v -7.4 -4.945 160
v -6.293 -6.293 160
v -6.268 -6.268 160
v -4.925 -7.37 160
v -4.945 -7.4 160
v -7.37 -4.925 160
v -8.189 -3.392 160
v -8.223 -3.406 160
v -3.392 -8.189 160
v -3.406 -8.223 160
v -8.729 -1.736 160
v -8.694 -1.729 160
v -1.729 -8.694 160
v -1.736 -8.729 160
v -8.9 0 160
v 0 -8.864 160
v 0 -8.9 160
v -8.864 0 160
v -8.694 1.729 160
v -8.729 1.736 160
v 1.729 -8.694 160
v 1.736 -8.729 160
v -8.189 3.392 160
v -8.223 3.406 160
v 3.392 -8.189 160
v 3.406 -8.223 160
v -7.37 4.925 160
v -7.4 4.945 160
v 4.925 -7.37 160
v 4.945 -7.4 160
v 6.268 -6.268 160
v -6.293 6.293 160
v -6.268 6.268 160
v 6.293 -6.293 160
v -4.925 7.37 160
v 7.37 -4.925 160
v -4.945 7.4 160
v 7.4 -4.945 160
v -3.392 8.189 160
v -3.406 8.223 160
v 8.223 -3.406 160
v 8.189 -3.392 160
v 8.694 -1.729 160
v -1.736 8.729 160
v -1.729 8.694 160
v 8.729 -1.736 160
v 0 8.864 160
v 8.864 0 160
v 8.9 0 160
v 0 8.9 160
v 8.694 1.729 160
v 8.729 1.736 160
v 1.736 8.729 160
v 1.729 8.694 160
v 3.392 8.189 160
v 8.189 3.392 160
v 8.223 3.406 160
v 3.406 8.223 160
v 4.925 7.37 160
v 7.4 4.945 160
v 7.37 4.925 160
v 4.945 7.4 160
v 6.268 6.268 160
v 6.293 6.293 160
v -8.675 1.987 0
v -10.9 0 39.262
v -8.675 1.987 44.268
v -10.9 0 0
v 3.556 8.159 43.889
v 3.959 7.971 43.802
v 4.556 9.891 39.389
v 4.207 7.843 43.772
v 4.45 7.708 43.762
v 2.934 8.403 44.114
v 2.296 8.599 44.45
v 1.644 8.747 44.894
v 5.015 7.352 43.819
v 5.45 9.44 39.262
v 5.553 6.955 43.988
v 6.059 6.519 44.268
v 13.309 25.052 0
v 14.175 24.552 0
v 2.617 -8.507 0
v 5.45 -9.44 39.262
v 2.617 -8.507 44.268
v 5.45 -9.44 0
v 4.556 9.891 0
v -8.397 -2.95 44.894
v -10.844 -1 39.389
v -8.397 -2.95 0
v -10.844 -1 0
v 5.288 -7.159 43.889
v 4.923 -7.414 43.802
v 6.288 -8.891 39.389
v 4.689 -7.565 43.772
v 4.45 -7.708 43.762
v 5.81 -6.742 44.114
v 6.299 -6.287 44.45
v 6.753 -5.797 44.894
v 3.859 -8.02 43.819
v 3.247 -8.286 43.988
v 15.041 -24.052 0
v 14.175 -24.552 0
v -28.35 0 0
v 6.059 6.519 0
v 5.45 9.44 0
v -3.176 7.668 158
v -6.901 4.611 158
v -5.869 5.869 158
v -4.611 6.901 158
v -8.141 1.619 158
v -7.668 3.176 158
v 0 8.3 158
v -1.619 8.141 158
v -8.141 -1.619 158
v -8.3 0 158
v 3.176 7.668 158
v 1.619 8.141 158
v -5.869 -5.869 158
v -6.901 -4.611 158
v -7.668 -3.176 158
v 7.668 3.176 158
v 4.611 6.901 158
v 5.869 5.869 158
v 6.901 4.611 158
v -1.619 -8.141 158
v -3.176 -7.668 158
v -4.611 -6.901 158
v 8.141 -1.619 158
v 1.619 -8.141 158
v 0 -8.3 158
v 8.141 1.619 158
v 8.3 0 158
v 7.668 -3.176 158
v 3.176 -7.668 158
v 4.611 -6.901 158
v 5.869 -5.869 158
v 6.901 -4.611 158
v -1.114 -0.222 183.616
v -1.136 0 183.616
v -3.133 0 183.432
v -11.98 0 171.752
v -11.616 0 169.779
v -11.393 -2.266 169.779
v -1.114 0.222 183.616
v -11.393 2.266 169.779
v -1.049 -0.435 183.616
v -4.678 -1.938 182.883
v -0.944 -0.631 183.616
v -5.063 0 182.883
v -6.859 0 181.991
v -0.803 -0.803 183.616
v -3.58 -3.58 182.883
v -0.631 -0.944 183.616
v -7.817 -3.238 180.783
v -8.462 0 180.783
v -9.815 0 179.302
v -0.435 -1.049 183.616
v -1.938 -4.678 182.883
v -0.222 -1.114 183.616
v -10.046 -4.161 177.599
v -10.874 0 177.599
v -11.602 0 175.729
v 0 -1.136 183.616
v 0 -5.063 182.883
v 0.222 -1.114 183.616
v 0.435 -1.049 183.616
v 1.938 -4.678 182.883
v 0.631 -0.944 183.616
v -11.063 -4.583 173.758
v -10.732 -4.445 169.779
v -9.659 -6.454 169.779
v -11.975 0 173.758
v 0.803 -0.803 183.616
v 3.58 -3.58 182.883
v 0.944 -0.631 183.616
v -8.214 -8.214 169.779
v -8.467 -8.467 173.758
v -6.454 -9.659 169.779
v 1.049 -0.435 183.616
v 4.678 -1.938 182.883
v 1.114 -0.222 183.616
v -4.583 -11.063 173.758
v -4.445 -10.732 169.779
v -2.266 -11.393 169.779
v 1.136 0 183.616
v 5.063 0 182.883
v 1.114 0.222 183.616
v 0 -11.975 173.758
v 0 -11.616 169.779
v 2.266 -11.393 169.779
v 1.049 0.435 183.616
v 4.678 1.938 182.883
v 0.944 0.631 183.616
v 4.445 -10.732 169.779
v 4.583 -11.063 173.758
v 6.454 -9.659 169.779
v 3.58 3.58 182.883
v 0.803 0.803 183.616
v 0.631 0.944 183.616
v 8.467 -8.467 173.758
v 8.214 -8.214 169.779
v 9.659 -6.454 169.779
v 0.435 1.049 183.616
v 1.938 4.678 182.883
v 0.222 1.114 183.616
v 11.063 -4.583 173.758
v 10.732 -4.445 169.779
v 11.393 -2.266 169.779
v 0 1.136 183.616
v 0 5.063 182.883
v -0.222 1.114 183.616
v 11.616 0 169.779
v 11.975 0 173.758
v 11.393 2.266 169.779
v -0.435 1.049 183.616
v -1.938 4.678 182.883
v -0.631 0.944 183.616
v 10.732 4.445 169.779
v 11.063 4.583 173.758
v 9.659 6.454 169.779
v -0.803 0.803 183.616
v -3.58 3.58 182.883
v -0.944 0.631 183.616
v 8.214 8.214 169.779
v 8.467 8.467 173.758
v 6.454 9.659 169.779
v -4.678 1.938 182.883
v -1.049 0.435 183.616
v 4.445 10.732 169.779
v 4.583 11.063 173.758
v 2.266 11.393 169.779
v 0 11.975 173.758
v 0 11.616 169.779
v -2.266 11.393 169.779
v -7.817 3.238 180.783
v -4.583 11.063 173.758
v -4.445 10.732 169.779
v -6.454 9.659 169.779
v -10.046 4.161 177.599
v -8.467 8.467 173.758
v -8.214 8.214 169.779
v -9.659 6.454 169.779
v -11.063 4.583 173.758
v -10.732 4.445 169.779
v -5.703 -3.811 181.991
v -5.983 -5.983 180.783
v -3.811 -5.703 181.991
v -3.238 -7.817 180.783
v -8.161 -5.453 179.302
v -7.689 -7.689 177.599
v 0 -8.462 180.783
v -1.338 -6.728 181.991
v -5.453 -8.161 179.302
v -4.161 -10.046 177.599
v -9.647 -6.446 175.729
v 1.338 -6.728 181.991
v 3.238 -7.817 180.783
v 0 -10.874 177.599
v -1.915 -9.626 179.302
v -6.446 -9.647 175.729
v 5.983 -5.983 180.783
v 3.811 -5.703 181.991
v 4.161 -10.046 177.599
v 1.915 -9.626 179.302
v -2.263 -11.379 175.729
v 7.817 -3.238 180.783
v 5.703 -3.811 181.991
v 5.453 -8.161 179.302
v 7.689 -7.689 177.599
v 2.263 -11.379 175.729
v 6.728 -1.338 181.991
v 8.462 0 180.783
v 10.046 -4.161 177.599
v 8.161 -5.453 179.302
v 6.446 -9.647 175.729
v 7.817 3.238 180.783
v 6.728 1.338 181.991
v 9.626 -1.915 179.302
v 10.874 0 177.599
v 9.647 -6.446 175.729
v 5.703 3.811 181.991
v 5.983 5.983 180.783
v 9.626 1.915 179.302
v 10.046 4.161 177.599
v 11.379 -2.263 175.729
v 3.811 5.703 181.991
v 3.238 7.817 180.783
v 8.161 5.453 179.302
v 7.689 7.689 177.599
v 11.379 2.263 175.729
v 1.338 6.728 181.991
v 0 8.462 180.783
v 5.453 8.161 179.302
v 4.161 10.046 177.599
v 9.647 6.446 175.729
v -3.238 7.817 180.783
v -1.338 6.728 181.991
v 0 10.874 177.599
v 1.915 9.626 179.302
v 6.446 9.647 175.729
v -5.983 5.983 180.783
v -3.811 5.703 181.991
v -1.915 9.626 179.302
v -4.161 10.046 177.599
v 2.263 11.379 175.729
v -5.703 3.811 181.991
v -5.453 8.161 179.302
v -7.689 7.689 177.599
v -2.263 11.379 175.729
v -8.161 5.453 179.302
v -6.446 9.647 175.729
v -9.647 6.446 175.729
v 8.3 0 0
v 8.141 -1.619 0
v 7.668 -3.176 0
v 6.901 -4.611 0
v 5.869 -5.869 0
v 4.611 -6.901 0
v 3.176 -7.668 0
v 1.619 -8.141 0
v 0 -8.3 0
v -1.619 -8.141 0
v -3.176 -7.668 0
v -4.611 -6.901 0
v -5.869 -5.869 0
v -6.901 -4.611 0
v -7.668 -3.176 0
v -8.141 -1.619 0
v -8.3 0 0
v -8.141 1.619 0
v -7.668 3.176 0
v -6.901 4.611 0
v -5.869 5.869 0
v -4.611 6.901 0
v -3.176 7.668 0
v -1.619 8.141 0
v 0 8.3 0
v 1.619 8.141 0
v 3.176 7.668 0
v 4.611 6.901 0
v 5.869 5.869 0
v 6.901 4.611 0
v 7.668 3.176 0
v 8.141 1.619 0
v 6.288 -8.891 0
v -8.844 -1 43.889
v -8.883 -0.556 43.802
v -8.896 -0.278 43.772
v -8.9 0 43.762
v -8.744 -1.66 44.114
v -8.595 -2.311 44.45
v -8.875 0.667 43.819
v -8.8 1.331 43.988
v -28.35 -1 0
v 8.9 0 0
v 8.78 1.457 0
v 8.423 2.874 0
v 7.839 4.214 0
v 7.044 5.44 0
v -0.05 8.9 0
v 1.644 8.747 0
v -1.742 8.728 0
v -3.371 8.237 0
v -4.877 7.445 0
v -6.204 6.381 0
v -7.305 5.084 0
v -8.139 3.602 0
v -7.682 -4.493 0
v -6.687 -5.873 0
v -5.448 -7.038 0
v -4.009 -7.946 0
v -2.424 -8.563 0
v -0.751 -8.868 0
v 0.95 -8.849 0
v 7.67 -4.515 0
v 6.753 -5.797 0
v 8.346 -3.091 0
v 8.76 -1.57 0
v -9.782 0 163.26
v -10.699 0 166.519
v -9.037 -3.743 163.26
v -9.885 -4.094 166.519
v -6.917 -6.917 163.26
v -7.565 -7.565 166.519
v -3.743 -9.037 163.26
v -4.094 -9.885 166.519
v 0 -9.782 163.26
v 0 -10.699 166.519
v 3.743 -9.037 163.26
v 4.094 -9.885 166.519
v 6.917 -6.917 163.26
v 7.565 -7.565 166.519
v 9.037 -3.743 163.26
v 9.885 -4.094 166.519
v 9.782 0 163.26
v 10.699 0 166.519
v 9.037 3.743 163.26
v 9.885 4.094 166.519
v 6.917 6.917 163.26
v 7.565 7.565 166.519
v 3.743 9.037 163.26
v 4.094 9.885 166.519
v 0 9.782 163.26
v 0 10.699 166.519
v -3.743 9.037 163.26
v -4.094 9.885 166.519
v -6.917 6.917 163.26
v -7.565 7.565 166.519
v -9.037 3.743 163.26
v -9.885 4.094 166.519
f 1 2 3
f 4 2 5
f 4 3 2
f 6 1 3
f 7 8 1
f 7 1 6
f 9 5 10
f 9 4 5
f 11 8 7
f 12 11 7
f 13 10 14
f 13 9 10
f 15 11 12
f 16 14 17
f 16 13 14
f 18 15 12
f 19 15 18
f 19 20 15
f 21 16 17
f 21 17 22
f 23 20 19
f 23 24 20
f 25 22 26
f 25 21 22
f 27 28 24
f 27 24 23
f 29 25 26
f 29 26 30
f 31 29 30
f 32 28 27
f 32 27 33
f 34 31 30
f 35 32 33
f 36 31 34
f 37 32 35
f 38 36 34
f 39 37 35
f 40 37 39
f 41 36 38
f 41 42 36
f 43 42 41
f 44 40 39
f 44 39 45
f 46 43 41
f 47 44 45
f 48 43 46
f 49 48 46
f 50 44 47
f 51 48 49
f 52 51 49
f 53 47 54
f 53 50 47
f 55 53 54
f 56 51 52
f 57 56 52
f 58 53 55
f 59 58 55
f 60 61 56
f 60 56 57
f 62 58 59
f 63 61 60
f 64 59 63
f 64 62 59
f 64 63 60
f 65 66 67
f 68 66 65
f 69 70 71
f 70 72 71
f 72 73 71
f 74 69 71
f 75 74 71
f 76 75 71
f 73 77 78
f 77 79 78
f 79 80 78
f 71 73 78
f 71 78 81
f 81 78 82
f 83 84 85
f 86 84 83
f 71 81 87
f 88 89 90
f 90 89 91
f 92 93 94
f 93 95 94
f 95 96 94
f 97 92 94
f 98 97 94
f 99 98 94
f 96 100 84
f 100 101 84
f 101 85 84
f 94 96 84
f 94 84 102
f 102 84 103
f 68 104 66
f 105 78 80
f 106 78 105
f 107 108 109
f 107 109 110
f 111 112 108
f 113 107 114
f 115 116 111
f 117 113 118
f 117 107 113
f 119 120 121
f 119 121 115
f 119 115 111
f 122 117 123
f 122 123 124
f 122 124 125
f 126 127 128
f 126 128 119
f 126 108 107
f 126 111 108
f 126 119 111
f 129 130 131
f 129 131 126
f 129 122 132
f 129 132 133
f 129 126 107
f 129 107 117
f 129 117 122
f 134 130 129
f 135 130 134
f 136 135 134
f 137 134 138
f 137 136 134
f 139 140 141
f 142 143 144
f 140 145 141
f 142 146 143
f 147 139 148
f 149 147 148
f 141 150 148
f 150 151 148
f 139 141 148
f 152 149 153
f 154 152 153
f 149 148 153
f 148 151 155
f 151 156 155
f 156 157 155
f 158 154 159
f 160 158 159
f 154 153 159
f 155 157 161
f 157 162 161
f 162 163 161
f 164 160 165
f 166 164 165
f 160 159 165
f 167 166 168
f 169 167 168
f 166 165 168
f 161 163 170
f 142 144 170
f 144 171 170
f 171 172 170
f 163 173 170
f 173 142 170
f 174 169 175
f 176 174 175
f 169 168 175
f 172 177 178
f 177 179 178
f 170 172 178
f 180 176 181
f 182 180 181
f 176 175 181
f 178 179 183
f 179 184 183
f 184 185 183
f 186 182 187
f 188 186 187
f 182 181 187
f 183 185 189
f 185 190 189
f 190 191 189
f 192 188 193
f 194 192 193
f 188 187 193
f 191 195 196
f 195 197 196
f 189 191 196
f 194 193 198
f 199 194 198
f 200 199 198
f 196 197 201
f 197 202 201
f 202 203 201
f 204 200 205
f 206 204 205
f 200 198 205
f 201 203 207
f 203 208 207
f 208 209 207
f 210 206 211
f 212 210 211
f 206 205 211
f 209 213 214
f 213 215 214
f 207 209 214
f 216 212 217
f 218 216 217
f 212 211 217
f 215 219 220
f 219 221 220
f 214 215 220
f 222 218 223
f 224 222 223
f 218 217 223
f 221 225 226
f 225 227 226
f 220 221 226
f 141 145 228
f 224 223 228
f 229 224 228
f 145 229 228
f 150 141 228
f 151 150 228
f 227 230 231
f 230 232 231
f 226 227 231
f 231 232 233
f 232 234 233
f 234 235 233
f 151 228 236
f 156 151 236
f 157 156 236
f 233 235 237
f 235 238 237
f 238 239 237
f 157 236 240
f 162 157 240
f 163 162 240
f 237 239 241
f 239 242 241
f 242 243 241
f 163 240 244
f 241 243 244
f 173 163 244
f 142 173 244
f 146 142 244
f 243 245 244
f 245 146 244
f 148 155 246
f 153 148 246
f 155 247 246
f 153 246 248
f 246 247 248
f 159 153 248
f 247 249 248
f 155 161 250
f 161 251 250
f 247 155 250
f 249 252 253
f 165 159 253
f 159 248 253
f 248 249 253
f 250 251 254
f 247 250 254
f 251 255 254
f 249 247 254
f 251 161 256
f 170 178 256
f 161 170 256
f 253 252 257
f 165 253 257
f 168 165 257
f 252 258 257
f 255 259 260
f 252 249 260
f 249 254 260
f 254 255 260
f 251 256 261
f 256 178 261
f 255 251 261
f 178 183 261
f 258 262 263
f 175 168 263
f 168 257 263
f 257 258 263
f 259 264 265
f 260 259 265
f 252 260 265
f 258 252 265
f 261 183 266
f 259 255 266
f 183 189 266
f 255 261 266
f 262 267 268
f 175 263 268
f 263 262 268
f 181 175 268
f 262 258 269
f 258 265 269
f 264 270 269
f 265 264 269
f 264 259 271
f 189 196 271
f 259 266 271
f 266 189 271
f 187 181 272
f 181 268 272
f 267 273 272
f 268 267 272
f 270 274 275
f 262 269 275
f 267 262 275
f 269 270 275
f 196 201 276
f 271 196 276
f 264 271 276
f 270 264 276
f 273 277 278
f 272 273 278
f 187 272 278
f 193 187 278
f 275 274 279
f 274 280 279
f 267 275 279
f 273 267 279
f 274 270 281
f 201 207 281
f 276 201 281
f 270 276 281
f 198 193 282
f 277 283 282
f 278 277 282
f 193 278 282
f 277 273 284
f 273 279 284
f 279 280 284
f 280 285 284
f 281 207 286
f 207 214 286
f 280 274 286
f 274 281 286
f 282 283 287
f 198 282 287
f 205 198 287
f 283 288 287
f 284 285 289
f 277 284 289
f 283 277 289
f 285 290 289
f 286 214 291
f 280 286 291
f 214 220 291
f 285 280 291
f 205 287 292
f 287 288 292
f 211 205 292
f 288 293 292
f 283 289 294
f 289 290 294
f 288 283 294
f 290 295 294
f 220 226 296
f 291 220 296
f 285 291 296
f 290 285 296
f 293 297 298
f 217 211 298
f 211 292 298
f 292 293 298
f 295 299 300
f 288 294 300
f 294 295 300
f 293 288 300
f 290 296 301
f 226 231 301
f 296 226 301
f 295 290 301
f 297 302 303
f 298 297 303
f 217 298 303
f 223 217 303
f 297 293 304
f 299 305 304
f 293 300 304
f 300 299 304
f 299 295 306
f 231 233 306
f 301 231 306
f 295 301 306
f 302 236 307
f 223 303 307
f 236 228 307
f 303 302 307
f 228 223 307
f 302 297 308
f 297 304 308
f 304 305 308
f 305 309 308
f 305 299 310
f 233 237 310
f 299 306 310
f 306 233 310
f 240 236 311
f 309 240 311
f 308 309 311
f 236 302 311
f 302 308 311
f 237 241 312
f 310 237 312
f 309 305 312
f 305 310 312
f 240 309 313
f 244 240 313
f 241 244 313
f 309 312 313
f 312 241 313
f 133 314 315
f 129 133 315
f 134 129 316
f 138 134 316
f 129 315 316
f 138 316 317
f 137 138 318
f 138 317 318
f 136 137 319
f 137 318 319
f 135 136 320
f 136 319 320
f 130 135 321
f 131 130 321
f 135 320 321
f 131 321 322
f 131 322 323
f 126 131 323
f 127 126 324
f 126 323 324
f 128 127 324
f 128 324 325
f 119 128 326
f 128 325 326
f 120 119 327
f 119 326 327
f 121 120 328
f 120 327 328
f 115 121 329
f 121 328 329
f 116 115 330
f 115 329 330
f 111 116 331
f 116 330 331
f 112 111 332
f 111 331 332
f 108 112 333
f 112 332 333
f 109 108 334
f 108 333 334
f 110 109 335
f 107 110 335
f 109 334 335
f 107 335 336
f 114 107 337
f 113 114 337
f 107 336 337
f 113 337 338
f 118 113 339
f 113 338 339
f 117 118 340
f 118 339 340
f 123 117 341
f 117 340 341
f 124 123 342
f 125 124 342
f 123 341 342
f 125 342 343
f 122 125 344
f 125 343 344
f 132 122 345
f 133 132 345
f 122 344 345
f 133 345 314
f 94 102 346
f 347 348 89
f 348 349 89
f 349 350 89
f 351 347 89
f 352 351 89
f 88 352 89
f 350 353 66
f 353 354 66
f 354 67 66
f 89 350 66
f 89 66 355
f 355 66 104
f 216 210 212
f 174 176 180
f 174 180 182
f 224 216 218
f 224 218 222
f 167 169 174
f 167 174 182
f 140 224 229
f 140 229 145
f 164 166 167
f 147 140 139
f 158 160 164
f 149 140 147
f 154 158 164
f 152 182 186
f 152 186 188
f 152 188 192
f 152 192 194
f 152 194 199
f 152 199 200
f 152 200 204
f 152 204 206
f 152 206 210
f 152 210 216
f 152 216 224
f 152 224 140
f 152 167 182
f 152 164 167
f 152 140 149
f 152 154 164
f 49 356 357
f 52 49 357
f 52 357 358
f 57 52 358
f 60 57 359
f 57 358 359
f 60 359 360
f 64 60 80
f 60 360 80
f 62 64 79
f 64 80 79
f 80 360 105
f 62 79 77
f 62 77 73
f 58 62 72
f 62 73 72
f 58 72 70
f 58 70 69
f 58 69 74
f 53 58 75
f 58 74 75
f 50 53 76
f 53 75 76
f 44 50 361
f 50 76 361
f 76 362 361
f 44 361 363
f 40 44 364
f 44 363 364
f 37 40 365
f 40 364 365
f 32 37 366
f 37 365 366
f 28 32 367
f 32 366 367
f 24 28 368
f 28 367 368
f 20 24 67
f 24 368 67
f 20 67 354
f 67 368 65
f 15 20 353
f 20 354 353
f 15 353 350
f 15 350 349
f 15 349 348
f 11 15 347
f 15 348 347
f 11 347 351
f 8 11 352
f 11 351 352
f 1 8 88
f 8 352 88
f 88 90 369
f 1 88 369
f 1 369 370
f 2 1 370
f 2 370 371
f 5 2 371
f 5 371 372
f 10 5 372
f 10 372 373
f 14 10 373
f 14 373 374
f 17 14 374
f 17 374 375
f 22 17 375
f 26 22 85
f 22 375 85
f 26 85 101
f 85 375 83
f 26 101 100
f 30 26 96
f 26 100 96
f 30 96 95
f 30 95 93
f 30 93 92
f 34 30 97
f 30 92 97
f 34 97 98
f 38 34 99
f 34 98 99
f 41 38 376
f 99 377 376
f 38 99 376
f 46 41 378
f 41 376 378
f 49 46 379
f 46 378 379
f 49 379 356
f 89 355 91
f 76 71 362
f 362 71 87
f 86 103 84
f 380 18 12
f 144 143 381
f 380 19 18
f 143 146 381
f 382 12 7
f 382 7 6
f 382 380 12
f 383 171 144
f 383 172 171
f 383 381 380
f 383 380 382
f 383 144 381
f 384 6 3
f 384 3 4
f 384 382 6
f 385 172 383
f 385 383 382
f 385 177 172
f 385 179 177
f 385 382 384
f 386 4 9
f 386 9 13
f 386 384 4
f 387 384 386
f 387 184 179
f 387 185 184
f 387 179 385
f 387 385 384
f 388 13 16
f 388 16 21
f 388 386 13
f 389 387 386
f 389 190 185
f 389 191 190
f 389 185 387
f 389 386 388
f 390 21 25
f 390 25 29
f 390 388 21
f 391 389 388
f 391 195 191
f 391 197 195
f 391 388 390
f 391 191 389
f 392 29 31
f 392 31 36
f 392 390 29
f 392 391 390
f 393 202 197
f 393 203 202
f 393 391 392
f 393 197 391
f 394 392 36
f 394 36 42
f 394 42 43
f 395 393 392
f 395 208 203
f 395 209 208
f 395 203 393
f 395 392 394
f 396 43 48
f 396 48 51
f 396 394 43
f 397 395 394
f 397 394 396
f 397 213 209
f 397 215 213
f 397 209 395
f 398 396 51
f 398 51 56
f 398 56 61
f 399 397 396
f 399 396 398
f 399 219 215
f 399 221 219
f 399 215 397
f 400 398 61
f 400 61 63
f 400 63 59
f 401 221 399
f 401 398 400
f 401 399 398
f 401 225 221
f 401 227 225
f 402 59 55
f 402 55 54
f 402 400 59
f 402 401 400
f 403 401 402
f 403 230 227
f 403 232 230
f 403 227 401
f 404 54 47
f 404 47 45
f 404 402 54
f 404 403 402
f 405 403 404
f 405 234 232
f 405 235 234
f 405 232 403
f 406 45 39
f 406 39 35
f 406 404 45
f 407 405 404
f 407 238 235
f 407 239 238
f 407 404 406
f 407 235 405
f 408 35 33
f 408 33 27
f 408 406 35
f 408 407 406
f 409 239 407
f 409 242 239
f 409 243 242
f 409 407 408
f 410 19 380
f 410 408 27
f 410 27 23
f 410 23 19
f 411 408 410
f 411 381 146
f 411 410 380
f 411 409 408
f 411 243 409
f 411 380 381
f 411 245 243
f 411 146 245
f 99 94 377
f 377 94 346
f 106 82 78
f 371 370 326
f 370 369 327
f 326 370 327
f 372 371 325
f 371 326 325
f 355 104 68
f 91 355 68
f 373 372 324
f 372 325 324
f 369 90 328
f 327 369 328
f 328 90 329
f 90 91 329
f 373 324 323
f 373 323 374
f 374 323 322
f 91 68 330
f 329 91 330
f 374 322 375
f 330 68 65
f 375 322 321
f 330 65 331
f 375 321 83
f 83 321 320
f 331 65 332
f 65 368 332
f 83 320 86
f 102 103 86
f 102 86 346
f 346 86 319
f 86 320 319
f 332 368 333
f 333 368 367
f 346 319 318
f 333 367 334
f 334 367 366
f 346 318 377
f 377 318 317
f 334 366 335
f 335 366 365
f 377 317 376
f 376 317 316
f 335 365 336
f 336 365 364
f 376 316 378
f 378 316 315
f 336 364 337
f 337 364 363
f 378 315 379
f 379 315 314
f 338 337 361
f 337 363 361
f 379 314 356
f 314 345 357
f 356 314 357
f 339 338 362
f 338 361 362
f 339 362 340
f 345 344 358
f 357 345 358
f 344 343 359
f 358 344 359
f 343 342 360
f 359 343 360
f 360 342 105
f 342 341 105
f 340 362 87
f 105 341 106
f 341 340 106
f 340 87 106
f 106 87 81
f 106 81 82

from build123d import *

# Parameters (mm, degrees)
SKETCH_R           = 8.9
PAD_DEPTH          = 160
SKETCH001_R        = 8.3
POCKET_DEPTH       = 158
PAD001_DEPTH       = 1
POLARPATTERN_COUNT = 3
CHAMFER_SIZE       = 2


with BuildPart() as part:
    # Sketch → Pad (new body)
    with BuildSketch(Plane.XY):
        Circle(SKETCH_R)
    extrude(amount=PAD_DEPTH)

    # Sketch001 (on Face2 of Pad) → Pocket (cut)
    with BuildSketch(Plane(origin=(0, 0, 0), x_dir=(1, 0, 0), z_dir=(0, 0, -1))):
        Circle(SKETCH001_R)
    extrude(amount=-POCKET_DEPTH, mode=Mode.SUBTRACT)

    # Sketch002 → Pad001 (join)
    with BuildSketch(Plane.XZ):
        Polygon((-8.35, 45), (-28.35, 0), (-8.35, 0), align=None)
    pad001 = extrude(amount=PAD001_DEPTH)

    # PolarPattern: Pad001 ×3 about axis
    polarpattern_axis = Axis((0, 0, 0), (0, 0, 1))
    for i in range(1, POLARPATTERN_COUNT):
        add(pad001.rotate(polarpattern_axis, i * 360 / POLARPATTERN_COUNT))

    # Sketch003 → Revolution (revolve)
    with BuildSketch(Plane.XZ):
        with BuildLine():
            Line((-1.135739, 183.616416), (0, 183.616416))
            Line((0, 183.616416), (0, 159.771789))
            Line((0, 159.771789), (-8.8, 159.771789))
            Line((-8.8, 159.771789), (-11.616332, 169.779203))
            ThreePointArc((-1.135739, 183.616416), (-9.8149, 179.302476), (-11.616332, 169.779203))
        make_face()
    revolve(axis=Axis((0, 0, 0), (0, 0, 1)))

    # Chamfer
    chamfer_edges = [part.edges().sort_by_distance(p)[0] for p in [
        (4.45, 7.707626, 21.88125),
        (5.287846, -7.158818, 21.944653),
        (4.45, -7.707626, 21.88125),
        (-8.843642, -1, 21.944653),
        (-8.9, 0, 21.88125),
        (3.555795, 8.158818, 21.944653),
    ]]
    chamfer(chamfer_edges, length=CHAMFER_SIZE)


solid = part.part
